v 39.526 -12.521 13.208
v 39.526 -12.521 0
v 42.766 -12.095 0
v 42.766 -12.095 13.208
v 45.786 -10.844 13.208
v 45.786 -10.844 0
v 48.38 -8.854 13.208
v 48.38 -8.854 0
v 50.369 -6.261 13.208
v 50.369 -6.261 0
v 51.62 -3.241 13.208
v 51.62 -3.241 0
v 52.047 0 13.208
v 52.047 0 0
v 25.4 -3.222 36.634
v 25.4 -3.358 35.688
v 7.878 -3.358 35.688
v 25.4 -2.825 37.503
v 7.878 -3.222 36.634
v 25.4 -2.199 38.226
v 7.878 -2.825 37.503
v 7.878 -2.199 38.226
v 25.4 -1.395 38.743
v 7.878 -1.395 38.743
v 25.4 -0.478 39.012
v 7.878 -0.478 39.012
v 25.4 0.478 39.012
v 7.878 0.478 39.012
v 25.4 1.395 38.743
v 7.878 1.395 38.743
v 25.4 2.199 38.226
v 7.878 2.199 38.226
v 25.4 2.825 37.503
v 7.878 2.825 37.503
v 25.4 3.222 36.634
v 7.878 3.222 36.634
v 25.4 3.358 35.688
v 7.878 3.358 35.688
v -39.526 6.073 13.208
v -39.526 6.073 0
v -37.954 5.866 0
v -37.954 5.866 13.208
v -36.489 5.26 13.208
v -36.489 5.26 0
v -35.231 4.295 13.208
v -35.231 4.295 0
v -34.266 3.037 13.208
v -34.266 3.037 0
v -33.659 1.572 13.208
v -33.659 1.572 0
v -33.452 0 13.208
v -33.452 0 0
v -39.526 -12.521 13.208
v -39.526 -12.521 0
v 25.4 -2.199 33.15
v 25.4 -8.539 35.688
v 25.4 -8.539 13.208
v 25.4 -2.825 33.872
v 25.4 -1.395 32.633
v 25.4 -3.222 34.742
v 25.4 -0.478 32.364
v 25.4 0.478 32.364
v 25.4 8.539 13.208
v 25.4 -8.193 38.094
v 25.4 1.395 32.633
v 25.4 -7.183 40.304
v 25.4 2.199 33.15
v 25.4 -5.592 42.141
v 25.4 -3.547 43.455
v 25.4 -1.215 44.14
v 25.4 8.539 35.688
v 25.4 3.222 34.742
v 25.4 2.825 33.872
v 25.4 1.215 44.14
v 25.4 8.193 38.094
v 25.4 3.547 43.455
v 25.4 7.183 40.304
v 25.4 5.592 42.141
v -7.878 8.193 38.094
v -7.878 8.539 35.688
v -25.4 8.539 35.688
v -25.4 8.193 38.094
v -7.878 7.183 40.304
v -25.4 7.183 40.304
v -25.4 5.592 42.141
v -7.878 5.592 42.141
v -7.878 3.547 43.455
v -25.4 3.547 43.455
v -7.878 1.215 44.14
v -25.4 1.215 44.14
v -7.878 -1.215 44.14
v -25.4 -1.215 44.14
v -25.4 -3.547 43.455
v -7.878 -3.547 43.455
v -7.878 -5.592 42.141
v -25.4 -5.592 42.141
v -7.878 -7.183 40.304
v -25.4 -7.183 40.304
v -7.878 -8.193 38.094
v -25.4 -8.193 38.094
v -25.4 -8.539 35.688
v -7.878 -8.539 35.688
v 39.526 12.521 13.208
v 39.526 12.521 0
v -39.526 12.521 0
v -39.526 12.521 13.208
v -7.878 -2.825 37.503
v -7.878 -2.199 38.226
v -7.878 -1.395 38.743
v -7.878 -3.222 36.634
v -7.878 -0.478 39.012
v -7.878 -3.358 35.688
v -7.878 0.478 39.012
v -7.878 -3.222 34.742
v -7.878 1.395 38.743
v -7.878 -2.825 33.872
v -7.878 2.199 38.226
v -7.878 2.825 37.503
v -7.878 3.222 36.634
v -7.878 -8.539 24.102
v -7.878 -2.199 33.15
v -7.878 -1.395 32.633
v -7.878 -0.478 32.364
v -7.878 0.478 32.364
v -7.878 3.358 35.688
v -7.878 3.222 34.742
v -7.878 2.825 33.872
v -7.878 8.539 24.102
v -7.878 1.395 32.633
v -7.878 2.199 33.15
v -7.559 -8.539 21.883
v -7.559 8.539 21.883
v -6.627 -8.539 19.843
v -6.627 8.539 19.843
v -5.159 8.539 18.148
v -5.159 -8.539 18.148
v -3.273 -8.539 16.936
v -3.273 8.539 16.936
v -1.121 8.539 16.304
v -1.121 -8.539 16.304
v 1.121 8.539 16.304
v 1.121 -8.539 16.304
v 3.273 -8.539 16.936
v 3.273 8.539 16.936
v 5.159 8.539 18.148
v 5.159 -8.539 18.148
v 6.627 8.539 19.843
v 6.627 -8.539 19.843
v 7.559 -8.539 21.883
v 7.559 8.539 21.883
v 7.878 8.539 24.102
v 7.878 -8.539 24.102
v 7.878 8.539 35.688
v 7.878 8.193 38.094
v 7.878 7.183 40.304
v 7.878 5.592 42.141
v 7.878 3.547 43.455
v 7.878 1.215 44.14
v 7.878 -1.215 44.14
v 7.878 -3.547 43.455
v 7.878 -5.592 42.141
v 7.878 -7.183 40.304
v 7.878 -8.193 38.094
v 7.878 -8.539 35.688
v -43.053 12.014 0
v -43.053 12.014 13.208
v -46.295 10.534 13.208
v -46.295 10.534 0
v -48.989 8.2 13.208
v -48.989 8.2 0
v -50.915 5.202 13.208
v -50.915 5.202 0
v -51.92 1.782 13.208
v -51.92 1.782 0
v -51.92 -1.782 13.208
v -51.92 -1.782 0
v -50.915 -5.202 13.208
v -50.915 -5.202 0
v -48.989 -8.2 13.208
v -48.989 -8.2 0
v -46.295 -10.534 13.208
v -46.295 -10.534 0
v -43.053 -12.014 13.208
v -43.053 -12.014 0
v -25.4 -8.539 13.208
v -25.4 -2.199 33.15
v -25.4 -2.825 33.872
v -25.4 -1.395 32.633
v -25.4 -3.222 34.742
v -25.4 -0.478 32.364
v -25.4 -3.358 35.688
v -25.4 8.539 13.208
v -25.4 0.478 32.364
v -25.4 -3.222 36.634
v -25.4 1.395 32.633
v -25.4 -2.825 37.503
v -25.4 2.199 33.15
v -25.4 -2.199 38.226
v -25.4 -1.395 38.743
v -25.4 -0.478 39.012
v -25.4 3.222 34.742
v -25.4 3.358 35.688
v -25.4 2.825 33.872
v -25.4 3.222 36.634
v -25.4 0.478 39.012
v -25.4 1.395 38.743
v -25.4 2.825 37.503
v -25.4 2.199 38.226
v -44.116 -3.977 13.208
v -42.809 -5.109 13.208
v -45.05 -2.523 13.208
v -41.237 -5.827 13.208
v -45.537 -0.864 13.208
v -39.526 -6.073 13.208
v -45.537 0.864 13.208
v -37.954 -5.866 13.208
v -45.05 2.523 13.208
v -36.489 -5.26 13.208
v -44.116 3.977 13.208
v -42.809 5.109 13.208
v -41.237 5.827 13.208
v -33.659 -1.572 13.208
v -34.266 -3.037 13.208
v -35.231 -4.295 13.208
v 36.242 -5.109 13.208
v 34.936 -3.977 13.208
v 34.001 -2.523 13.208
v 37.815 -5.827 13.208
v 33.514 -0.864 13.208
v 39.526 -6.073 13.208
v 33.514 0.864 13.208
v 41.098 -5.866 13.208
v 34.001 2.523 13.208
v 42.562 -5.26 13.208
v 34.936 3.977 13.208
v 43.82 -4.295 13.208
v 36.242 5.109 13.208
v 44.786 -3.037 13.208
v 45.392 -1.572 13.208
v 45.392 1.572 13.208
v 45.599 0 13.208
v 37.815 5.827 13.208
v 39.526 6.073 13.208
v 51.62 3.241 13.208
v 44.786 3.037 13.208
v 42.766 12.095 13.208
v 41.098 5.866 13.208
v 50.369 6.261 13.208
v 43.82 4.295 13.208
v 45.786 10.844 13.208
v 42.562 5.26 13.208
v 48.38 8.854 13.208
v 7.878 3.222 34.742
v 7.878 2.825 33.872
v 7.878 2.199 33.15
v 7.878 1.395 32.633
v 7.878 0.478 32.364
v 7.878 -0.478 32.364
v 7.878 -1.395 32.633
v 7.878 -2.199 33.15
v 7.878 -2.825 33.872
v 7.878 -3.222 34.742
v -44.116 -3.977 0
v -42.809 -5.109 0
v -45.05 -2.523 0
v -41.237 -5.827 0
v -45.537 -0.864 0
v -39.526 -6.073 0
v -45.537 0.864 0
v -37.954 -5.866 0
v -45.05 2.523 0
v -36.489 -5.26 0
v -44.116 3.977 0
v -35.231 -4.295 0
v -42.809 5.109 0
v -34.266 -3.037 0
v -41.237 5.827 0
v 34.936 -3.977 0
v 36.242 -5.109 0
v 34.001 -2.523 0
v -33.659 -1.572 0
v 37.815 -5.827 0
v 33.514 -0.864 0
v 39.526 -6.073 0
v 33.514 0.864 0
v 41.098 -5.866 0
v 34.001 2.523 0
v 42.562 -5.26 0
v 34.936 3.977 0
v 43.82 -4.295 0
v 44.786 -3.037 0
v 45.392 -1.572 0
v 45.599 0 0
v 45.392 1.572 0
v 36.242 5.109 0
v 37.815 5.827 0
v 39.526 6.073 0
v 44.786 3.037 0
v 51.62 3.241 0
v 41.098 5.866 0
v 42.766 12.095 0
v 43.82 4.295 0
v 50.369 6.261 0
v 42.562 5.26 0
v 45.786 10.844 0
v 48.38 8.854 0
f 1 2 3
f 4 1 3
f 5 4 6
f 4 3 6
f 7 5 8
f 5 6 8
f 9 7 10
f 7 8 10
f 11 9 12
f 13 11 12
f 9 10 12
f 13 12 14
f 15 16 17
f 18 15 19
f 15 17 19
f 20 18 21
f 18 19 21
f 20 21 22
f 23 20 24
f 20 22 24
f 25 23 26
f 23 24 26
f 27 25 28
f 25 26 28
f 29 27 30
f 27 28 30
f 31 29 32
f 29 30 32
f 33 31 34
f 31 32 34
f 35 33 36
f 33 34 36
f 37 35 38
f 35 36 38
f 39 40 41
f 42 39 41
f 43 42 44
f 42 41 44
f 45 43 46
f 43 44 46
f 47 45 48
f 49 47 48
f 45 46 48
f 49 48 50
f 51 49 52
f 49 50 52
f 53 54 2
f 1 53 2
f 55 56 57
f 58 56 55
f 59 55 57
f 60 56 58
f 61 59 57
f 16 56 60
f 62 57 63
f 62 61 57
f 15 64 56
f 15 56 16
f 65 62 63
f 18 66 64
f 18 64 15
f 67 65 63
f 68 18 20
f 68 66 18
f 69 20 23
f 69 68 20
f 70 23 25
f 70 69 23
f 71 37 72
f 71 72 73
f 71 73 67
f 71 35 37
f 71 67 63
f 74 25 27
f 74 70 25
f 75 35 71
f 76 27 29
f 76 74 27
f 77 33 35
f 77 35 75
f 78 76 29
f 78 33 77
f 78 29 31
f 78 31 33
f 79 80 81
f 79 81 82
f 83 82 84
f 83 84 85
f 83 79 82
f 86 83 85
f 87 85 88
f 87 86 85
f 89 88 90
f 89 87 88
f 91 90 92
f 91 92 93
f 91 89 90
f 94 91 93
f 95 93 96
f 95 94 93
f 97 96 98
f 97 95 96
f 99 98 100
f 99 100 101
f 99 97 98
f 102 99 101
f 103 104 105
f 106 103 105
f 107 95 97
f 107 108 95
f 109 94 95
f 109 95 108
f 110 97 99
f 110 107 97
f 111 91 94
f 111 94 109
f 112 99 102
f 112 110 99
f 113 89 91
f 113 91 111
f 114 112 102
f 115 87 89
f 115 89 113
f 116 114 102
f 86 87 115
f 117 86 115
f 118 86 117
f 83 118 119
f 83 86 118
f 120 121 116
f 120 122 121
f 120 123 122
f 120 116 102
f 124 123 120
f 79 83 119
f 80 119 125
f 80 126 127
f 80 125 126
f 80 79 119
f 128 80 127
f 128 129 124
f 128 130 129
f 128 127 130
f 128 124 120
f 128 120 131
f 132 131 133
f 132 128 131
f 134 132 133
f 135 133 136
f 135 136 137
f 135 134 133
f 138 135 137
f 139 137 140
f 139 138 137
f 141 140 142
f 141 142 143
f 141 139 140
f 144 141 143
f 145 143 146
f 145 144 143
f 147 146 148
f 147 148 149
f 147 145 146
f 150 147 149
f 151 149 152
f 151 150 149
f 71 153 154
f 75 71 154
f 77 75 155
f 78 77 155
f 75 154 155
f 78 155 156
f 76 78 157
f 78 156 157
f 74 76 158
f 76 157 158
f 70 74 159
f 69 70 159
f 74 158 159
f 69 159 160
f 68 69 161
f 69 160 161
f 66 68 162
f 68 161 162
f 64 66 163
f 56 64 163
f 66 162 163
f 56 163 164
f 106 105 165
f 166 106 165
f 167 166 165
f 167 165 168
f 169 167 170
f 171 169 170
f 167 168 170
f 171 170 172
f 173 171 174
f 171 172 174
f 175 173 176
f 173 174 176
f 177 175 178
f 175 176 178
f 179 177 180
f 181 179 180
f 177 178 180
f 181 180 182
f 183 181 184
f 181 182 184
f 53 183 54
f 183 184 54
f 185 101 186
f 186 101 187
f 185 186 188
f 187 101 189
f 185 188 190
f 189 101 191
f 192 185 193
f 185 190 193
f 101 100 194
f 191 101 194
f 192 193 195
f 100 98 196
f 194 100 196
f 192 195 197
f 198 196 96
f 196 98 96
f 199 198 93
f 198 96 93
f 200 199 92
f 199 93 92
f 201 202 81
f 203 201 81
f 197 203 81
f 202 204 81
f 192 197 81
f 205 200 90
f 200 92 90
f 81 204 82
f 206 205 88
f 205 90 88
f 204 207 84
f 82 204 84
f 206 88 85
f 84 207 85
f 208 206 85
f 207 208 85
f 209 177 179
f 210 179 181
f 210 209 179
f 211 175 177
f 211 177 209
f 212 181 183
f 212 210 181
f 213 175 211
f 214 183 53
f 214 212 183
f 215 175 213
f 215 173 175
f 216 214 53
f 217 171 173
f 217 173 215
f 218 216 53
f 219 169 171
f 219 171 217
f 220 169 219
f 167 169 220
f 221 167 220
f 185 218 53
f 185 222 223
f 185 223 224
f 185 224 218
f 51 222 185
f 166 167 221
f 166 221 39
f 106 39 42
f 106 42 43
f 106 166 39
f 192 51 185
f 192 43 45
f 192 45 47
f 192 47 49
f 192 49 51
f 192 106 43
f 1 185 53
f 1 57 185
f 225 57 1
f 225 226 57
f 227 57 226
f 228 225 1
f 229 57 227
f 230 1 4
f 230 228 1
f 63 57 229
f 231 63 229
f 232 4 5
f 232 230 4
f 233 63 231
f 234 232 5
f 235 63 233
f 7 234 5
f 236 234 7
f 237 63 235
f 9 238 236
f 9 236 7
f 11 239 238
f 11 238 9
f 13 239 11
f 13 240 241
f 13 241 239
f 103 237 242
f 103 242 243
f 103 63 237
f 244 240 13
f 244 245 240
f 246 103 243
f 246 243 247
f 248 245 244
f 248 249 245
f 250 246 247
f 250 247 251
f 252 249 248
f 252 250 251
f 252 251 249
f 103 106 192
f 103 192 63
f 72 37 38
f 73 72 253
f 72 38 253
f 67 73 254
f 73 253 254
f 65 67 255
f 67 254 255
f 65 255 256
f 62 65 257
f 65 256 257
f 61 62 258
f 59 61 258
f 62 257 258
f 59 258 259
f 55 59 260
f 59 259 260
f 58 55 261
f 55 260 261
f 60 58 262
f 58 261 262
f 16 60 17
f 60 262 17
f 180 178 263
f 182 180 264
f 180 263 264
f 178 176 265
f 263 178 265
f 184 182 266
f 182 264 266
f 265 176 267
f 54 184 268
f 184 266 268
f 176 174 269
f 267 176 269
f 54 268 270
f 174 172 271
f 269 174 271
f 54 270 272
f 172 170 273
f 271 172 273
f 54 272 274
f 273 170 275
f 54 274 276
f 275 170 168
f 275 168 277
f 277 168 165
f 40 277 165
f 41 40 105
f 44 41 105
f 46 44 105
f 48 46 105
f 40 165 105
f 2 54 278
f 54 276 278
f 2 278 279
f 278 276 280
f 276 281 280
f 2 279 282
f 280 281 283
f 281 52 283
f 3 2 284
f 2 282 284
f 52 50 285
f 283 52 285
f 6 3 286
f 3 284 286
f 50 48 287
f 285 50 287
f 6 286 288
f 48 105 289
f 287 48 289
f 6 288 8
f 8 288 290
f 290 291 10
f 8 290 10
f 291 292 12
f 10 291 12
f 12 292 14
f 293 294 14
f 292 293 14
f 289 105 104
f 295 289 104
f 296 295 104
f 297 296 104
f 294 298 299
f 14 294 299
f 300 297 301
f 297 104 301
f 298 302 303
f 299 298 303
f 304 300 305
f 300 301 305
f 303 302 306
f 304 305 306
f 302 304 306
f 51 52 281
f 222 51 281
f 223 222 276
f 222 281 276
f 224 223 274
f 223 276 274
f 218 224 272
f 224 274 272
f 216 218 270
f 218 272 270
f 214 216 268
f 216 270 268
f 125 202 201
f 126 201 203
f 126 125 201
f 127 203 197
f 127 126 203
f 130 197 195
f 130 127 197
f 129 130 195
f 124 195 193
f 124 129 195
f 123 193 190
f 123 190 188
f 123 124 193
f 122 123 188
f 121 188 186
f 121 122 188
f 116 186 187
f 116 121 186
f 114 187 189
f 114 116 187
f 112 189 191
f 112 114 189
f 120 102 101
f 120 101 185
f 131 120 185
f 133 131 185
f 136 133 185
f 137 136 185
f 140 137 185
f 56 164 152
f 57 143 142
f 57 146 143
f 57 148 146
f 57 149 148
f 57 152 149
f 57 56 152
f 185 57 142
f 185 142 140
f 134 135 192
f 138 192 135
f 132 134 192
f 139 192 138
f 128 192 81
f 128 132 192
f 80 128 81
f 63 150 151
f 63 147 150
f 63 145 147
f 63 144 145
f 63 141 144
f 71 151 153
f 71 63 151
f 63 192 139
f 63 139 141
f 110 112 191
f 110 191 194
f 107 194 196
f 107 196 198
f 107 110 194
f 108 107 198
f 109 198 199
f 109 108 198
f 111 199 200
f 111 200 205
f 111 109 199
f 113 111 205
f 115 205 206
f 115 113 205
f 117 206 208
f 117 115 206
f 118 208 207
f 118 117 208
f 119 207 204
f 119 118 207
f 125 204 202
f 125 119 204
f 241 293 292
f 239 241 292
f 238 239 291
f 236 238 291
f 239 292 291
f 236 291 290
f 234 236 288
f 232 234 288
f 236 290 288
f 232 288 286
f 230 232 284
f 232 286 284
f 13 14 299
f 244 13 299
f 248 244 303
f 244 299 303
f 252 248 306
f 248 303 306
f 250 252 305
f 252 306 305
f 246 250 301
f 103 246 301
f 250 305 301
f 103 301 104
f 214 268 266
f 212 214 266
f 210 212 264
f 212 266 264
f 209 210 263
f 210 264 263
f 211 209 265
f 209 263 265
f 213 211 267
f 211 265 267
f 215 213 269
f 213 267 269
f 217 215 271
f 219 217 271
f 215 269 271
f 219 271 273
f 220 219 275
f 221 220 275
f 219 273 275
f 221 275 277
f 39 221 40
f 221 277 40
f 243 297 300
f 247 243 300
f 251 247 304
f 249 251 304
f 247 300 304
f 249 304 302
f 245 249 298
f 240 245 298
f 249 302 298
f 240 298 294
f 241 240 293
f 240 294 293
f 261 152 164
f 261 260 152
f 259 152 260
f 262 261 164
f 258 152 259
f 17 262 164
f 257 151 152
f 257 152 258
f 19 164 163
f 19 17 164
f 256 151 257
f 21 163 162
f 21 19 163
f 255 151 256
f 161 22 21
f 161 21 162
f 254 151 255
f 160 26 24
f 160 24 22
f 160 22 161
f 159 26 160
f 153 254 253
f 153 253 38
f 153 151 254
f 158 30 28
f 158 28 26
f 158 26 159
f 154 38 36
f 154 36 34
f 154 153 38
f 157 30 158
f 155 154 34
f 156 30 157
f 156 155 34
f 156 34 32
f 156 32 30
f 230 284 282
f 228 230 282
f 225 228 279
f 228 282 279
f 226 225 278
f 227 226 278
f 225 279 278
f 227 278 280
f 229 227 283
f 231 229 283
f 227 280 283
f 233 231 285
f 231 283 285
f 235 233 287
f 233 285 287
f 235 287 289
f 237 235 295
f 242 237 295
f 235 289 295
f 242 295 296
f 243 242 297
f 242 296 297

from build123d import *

# Parameters (mm, degrees)
F1_DEPTH = 13.208
F3_DEPTH = 25.4
F4_DEPTH = 25.4
F6_DEPTH = 25.4
F7_DEPTH = 25.4


with BuildPart() as f1:
    # F0 (on Top) → F1 (new body)
    with BuildSketch(Plane.XY):
        with BuildLine():
            ThreePointArc((39.5257622004, -12.5212473795), (27.0045148209, 0), (39.5257622004, 12.5212473795))
            Line((39.5257622004, 12.5212473795), (-39.5257622004, 12.5212473795))
            ThreePointArc((-39.5257622004, 12.5212473795), (-30.6719032694, 8.8538589309), (-27.0045148209, 0))
            ThreePointArc((-27.0045148209, 0), (-30.6719032694, -8.8538589309), (-39.5257622004, -12.5212473795))
            Line((-39.5257622004, -12.5212473795), (39.5257622004, -12.5212473795))
        make_face()
        with BuildLine():
            ThreePointArc((52.0470095798, 0), (48.3796211313, 8.8538589309), (39.5257622004, 12.5212473795))
            Line((39.5257622004, 12.5212473795), (39.5257622004, 6.073428591))
            ThreePointArc((39.5257622004, 6.073428591), (43.8203247421, 4.2945625417), (45.5991907913, 0))
            ThreePointArc((45.5991907913, 0), (43.8203247421, -4.2945625417), (39.5257622004, -6.073428591))
            Line((39.5257622004, -6.073428591), (39.5257622004, -12.5212473795))
            ThreePointArc((39.5257622004, -12.5212473795), (48.3796211313, -8.8538589309), (52.0470095798, 0))
        make_face()
        with BuildLine():
            Line((39.5257622004, 6.073428591), (39.5257622004, 12.5212473795))
            ThreePointArc((39.5257622004, 12.5212473795), (27.0045148209, 0), (39.5257622004, -12.5212473795))
            Line((39.5257622004, -12.5212473795), (39.5257622004, -6.073428591))
            ThreePointArc((39.5257622004, -6.073428591), (33.4523336094, 0), (39.5257622004, 6.073428591))
        make_face()
        with BuildLine():
            ThreePointArc((-27.0045148209, 0), (-30.6719032694, 8.8538589309), (-39.5257622004, 12.5212473795))
            Line((-39.5257622004, 12.5212473795), (-39.5257622004, 6.073428591))
            ThreePointArc((-39.5257622004, 6.073428591), (-35.2311996586, 4.2945625417), (-33.4523336094, 0))
            ThreePointArc((-33.4523336094, 0), (-35.2311996586, -4.2945625417), (-39.5257622004, -6.073428591))
            Line((-39.5257622004, -6.073428591), (-39.5257622004, -12.5212473795))
            ThreePointArc((-39.5257622004, -12.5212473795), (-30.6719032694, -8.8538589309), (-27.0045148209, 0))
        make_face()
        with BuildLine():
            Line((-39.5257622004, 6.073428591), (-39.5257622004, 12.5212473795))
            ThreePointArc((-39.5257622004, 12.5212473795), (-52.0470095798, 0), (-39.5257622004, -12.5212473795))
            Line((-39.5257622004, -12.5212473795), (-39.5257622004, -6.073428591))
            ThreePointArc((-39.5257622004, -6.073428591), (-45.5991907913, 0), (-39.5257622004, 6.073428591))
        make_face()
    extrude(amount=F1_DEPTH)

    # F2 (on Right) → F3 (join)
    with BuildSketch(Plane.YZ):
        with BuildLine():
            Line((8.5389625284, 35.6879048049), (3.3581880853, 35.6879048049))
            ThreePointArc((3.3581880853, 35.6879048049), (0, 32.3297167197), (-3.3581880853, 35.6879048049))
            Line((-3.3581880853, 35.6879048049), (-8.5389625284, 35.6879048049))
            ThreePointArc((-8.5389625284, 35.6879048049), (0, 27.1489422766), (8.5389625284, 35.6879048049))
        make_face()
        with BuildLine():
            ThreePointArc((-3.3581880853, 35.6879048049), (0, 39.0460928902), (3.3581880853, 35.6879048049))
            Line((3.3581880853, 35.6879048049), (8.5389625284, 35.6879048049))
            ThreePointArc((8.5389625284, 35.6879048049), (0, 44.2268673333), (-8.5389625284, 35.6879048049))
            Line((-8.5389625284, 35.6879048049), (-3.3581880853, 35.6879048049))
        make_face()
        with BuildLine():
            Line((8.5389625284, 0), (8.5389625284, 35.6879048049))
            ThreePointArc((8.5389625284, 35.6879048049), (0, 27.1489422766), (-8.5389625284, 35.6879048049))
            Line((-8.5389625284, 35.6879048049), (-8.5389625284, 0))
            Line((-8.5389625284, 0), (8.5389625284, 0))
        make_face()
    extrude(amount=F3_DEPTH)

    # F2 (on Right) → F4 (join)
    with BuildSketch(Plane.YZ):
        with BuildLine():
            Line((8.5389625284, 35.6879048049), (3.3581880853, 35.6879048049))
            ThreePointArc((3.3581880853, 35.6879048049), (0, 32.3297167197), (-3.3581880853, 35.6879048049))
            Line((-3.3581880853, 35.6879048049), (-8.5389625284, 35.6879048049))
            ThreePointArc((-8.5389625284, 35.6879048049), (0, 27.1489422766), (8.5389625284, 35.6879048049))
        make_face()
        with BuildLine():
            ThreePointArc((-3.3581880853, 35.6879048049), (0, 39.0460928902), (3.3581880853, 35.6879048049))
            Line((3.3581880853, 35.6879048049), (8.5389625284, 35.6879048049))
            ThreePointArc((8.5389625284, 35.6879048049), (0, 44.2268673333), (-8.5389625284, 35.6879048049))
            Line((-8.5389625284, 35.6879048049), (-3.3581880853, 35.6879048049))
        make_face()
        with BuildLine():
            Line((8.5389625284, 0), (8.5389625284, 35.6879048049))
            ThreePointArc((8.5389625284, 35.6879048049), (0, 27.1489422766), (-8.5389625284, 35.6879048049))
            Line((-8.5389625284, 35.6879048049), (-8.5389625284, 0))
            Line((-8.5389625284, 0), (8.5389625284, 0))
        make_face()
    extrude(amount=-F4_DEPTH)

    # F5 (on Front) → F6 (cut)
    with BuildSketch(Plane.XZ):
        with BuildLine():
            Line((-7.8779369453, 24.1020768881), (7.8779369453, 24.1020768881))
            ThreePointArc((7.8779369453, 24.1020768881), (0, 31.9800138334), (-7.8779369453, 24.1020768881))
        make_face()
        with BuildLine():
            ThreePointArc((-7.8779369453, 24.1020768881), (0, 16.2241399428), (7.8779369453, 24.1020768881))
            Line((7.8779369453, 24.1020768881), (-7.8779369453, 24.1020768881))
        make_face()
        with BuildLine():
            ThreePointArc((-7.8779369453, 24.1020768881), (0, 31.9800138334), (7.8779369453, 24.1020768881))
            Line((7.8779369453, 24.1020768881), (7.8779369453, 49.5002679527))
            Line((7.8779369453, 49.5002679527), (-7.8779369453, 49.5002679527))
            Line((-7.8779369453, 49.5002679527), (-7.8779369453, 24.1020768881))
        make_face()
    extrude(amount=-F6_DEPTH, mode=Mode.SUBTRACT)

    # F5 (on Front) → F7 (cut)
    with BuildSketch(Plane.XZ):
        with BuildLine():
            Line((-7.8779369453, 24.1020768881), (7.8779369453, 24.1020768881))
            ThreePointArc((7.8779369453, 24.1020768881), (0, 31.9800138334), (-7.8779369453, 24.1020768881))
        make_face()
        with BuildLine():
            ThreePointArc((-7.8779369453, 24.1020768881), (0, 16.2241399428), (7.8779369453, 24.1020768881))
            Line((7.8779369453, 24.1020768881), (-7.8779369453, 24.1020768881))
        make_face()
        with BuildLine():
            ThreePointArc((-7.8779369453, 24.1020768881), (0, 31.9800138334), (7.8779369453, 24.1020768881))
            Line((7.8779369453, 24.1020768881), (7.8779369453, 49.5002679527))
            Line((7.8779369453, 49.5002679527), (-7.8779369453, 49.5002679527))
            Line((-7.8779369453, 49.5002679527), (-7.8779369453, 24.1020768881))
        make_face()
    extrude(amount=F7_DEPTH, mode=Mode.SUBTRACT)


solid = f1.part
